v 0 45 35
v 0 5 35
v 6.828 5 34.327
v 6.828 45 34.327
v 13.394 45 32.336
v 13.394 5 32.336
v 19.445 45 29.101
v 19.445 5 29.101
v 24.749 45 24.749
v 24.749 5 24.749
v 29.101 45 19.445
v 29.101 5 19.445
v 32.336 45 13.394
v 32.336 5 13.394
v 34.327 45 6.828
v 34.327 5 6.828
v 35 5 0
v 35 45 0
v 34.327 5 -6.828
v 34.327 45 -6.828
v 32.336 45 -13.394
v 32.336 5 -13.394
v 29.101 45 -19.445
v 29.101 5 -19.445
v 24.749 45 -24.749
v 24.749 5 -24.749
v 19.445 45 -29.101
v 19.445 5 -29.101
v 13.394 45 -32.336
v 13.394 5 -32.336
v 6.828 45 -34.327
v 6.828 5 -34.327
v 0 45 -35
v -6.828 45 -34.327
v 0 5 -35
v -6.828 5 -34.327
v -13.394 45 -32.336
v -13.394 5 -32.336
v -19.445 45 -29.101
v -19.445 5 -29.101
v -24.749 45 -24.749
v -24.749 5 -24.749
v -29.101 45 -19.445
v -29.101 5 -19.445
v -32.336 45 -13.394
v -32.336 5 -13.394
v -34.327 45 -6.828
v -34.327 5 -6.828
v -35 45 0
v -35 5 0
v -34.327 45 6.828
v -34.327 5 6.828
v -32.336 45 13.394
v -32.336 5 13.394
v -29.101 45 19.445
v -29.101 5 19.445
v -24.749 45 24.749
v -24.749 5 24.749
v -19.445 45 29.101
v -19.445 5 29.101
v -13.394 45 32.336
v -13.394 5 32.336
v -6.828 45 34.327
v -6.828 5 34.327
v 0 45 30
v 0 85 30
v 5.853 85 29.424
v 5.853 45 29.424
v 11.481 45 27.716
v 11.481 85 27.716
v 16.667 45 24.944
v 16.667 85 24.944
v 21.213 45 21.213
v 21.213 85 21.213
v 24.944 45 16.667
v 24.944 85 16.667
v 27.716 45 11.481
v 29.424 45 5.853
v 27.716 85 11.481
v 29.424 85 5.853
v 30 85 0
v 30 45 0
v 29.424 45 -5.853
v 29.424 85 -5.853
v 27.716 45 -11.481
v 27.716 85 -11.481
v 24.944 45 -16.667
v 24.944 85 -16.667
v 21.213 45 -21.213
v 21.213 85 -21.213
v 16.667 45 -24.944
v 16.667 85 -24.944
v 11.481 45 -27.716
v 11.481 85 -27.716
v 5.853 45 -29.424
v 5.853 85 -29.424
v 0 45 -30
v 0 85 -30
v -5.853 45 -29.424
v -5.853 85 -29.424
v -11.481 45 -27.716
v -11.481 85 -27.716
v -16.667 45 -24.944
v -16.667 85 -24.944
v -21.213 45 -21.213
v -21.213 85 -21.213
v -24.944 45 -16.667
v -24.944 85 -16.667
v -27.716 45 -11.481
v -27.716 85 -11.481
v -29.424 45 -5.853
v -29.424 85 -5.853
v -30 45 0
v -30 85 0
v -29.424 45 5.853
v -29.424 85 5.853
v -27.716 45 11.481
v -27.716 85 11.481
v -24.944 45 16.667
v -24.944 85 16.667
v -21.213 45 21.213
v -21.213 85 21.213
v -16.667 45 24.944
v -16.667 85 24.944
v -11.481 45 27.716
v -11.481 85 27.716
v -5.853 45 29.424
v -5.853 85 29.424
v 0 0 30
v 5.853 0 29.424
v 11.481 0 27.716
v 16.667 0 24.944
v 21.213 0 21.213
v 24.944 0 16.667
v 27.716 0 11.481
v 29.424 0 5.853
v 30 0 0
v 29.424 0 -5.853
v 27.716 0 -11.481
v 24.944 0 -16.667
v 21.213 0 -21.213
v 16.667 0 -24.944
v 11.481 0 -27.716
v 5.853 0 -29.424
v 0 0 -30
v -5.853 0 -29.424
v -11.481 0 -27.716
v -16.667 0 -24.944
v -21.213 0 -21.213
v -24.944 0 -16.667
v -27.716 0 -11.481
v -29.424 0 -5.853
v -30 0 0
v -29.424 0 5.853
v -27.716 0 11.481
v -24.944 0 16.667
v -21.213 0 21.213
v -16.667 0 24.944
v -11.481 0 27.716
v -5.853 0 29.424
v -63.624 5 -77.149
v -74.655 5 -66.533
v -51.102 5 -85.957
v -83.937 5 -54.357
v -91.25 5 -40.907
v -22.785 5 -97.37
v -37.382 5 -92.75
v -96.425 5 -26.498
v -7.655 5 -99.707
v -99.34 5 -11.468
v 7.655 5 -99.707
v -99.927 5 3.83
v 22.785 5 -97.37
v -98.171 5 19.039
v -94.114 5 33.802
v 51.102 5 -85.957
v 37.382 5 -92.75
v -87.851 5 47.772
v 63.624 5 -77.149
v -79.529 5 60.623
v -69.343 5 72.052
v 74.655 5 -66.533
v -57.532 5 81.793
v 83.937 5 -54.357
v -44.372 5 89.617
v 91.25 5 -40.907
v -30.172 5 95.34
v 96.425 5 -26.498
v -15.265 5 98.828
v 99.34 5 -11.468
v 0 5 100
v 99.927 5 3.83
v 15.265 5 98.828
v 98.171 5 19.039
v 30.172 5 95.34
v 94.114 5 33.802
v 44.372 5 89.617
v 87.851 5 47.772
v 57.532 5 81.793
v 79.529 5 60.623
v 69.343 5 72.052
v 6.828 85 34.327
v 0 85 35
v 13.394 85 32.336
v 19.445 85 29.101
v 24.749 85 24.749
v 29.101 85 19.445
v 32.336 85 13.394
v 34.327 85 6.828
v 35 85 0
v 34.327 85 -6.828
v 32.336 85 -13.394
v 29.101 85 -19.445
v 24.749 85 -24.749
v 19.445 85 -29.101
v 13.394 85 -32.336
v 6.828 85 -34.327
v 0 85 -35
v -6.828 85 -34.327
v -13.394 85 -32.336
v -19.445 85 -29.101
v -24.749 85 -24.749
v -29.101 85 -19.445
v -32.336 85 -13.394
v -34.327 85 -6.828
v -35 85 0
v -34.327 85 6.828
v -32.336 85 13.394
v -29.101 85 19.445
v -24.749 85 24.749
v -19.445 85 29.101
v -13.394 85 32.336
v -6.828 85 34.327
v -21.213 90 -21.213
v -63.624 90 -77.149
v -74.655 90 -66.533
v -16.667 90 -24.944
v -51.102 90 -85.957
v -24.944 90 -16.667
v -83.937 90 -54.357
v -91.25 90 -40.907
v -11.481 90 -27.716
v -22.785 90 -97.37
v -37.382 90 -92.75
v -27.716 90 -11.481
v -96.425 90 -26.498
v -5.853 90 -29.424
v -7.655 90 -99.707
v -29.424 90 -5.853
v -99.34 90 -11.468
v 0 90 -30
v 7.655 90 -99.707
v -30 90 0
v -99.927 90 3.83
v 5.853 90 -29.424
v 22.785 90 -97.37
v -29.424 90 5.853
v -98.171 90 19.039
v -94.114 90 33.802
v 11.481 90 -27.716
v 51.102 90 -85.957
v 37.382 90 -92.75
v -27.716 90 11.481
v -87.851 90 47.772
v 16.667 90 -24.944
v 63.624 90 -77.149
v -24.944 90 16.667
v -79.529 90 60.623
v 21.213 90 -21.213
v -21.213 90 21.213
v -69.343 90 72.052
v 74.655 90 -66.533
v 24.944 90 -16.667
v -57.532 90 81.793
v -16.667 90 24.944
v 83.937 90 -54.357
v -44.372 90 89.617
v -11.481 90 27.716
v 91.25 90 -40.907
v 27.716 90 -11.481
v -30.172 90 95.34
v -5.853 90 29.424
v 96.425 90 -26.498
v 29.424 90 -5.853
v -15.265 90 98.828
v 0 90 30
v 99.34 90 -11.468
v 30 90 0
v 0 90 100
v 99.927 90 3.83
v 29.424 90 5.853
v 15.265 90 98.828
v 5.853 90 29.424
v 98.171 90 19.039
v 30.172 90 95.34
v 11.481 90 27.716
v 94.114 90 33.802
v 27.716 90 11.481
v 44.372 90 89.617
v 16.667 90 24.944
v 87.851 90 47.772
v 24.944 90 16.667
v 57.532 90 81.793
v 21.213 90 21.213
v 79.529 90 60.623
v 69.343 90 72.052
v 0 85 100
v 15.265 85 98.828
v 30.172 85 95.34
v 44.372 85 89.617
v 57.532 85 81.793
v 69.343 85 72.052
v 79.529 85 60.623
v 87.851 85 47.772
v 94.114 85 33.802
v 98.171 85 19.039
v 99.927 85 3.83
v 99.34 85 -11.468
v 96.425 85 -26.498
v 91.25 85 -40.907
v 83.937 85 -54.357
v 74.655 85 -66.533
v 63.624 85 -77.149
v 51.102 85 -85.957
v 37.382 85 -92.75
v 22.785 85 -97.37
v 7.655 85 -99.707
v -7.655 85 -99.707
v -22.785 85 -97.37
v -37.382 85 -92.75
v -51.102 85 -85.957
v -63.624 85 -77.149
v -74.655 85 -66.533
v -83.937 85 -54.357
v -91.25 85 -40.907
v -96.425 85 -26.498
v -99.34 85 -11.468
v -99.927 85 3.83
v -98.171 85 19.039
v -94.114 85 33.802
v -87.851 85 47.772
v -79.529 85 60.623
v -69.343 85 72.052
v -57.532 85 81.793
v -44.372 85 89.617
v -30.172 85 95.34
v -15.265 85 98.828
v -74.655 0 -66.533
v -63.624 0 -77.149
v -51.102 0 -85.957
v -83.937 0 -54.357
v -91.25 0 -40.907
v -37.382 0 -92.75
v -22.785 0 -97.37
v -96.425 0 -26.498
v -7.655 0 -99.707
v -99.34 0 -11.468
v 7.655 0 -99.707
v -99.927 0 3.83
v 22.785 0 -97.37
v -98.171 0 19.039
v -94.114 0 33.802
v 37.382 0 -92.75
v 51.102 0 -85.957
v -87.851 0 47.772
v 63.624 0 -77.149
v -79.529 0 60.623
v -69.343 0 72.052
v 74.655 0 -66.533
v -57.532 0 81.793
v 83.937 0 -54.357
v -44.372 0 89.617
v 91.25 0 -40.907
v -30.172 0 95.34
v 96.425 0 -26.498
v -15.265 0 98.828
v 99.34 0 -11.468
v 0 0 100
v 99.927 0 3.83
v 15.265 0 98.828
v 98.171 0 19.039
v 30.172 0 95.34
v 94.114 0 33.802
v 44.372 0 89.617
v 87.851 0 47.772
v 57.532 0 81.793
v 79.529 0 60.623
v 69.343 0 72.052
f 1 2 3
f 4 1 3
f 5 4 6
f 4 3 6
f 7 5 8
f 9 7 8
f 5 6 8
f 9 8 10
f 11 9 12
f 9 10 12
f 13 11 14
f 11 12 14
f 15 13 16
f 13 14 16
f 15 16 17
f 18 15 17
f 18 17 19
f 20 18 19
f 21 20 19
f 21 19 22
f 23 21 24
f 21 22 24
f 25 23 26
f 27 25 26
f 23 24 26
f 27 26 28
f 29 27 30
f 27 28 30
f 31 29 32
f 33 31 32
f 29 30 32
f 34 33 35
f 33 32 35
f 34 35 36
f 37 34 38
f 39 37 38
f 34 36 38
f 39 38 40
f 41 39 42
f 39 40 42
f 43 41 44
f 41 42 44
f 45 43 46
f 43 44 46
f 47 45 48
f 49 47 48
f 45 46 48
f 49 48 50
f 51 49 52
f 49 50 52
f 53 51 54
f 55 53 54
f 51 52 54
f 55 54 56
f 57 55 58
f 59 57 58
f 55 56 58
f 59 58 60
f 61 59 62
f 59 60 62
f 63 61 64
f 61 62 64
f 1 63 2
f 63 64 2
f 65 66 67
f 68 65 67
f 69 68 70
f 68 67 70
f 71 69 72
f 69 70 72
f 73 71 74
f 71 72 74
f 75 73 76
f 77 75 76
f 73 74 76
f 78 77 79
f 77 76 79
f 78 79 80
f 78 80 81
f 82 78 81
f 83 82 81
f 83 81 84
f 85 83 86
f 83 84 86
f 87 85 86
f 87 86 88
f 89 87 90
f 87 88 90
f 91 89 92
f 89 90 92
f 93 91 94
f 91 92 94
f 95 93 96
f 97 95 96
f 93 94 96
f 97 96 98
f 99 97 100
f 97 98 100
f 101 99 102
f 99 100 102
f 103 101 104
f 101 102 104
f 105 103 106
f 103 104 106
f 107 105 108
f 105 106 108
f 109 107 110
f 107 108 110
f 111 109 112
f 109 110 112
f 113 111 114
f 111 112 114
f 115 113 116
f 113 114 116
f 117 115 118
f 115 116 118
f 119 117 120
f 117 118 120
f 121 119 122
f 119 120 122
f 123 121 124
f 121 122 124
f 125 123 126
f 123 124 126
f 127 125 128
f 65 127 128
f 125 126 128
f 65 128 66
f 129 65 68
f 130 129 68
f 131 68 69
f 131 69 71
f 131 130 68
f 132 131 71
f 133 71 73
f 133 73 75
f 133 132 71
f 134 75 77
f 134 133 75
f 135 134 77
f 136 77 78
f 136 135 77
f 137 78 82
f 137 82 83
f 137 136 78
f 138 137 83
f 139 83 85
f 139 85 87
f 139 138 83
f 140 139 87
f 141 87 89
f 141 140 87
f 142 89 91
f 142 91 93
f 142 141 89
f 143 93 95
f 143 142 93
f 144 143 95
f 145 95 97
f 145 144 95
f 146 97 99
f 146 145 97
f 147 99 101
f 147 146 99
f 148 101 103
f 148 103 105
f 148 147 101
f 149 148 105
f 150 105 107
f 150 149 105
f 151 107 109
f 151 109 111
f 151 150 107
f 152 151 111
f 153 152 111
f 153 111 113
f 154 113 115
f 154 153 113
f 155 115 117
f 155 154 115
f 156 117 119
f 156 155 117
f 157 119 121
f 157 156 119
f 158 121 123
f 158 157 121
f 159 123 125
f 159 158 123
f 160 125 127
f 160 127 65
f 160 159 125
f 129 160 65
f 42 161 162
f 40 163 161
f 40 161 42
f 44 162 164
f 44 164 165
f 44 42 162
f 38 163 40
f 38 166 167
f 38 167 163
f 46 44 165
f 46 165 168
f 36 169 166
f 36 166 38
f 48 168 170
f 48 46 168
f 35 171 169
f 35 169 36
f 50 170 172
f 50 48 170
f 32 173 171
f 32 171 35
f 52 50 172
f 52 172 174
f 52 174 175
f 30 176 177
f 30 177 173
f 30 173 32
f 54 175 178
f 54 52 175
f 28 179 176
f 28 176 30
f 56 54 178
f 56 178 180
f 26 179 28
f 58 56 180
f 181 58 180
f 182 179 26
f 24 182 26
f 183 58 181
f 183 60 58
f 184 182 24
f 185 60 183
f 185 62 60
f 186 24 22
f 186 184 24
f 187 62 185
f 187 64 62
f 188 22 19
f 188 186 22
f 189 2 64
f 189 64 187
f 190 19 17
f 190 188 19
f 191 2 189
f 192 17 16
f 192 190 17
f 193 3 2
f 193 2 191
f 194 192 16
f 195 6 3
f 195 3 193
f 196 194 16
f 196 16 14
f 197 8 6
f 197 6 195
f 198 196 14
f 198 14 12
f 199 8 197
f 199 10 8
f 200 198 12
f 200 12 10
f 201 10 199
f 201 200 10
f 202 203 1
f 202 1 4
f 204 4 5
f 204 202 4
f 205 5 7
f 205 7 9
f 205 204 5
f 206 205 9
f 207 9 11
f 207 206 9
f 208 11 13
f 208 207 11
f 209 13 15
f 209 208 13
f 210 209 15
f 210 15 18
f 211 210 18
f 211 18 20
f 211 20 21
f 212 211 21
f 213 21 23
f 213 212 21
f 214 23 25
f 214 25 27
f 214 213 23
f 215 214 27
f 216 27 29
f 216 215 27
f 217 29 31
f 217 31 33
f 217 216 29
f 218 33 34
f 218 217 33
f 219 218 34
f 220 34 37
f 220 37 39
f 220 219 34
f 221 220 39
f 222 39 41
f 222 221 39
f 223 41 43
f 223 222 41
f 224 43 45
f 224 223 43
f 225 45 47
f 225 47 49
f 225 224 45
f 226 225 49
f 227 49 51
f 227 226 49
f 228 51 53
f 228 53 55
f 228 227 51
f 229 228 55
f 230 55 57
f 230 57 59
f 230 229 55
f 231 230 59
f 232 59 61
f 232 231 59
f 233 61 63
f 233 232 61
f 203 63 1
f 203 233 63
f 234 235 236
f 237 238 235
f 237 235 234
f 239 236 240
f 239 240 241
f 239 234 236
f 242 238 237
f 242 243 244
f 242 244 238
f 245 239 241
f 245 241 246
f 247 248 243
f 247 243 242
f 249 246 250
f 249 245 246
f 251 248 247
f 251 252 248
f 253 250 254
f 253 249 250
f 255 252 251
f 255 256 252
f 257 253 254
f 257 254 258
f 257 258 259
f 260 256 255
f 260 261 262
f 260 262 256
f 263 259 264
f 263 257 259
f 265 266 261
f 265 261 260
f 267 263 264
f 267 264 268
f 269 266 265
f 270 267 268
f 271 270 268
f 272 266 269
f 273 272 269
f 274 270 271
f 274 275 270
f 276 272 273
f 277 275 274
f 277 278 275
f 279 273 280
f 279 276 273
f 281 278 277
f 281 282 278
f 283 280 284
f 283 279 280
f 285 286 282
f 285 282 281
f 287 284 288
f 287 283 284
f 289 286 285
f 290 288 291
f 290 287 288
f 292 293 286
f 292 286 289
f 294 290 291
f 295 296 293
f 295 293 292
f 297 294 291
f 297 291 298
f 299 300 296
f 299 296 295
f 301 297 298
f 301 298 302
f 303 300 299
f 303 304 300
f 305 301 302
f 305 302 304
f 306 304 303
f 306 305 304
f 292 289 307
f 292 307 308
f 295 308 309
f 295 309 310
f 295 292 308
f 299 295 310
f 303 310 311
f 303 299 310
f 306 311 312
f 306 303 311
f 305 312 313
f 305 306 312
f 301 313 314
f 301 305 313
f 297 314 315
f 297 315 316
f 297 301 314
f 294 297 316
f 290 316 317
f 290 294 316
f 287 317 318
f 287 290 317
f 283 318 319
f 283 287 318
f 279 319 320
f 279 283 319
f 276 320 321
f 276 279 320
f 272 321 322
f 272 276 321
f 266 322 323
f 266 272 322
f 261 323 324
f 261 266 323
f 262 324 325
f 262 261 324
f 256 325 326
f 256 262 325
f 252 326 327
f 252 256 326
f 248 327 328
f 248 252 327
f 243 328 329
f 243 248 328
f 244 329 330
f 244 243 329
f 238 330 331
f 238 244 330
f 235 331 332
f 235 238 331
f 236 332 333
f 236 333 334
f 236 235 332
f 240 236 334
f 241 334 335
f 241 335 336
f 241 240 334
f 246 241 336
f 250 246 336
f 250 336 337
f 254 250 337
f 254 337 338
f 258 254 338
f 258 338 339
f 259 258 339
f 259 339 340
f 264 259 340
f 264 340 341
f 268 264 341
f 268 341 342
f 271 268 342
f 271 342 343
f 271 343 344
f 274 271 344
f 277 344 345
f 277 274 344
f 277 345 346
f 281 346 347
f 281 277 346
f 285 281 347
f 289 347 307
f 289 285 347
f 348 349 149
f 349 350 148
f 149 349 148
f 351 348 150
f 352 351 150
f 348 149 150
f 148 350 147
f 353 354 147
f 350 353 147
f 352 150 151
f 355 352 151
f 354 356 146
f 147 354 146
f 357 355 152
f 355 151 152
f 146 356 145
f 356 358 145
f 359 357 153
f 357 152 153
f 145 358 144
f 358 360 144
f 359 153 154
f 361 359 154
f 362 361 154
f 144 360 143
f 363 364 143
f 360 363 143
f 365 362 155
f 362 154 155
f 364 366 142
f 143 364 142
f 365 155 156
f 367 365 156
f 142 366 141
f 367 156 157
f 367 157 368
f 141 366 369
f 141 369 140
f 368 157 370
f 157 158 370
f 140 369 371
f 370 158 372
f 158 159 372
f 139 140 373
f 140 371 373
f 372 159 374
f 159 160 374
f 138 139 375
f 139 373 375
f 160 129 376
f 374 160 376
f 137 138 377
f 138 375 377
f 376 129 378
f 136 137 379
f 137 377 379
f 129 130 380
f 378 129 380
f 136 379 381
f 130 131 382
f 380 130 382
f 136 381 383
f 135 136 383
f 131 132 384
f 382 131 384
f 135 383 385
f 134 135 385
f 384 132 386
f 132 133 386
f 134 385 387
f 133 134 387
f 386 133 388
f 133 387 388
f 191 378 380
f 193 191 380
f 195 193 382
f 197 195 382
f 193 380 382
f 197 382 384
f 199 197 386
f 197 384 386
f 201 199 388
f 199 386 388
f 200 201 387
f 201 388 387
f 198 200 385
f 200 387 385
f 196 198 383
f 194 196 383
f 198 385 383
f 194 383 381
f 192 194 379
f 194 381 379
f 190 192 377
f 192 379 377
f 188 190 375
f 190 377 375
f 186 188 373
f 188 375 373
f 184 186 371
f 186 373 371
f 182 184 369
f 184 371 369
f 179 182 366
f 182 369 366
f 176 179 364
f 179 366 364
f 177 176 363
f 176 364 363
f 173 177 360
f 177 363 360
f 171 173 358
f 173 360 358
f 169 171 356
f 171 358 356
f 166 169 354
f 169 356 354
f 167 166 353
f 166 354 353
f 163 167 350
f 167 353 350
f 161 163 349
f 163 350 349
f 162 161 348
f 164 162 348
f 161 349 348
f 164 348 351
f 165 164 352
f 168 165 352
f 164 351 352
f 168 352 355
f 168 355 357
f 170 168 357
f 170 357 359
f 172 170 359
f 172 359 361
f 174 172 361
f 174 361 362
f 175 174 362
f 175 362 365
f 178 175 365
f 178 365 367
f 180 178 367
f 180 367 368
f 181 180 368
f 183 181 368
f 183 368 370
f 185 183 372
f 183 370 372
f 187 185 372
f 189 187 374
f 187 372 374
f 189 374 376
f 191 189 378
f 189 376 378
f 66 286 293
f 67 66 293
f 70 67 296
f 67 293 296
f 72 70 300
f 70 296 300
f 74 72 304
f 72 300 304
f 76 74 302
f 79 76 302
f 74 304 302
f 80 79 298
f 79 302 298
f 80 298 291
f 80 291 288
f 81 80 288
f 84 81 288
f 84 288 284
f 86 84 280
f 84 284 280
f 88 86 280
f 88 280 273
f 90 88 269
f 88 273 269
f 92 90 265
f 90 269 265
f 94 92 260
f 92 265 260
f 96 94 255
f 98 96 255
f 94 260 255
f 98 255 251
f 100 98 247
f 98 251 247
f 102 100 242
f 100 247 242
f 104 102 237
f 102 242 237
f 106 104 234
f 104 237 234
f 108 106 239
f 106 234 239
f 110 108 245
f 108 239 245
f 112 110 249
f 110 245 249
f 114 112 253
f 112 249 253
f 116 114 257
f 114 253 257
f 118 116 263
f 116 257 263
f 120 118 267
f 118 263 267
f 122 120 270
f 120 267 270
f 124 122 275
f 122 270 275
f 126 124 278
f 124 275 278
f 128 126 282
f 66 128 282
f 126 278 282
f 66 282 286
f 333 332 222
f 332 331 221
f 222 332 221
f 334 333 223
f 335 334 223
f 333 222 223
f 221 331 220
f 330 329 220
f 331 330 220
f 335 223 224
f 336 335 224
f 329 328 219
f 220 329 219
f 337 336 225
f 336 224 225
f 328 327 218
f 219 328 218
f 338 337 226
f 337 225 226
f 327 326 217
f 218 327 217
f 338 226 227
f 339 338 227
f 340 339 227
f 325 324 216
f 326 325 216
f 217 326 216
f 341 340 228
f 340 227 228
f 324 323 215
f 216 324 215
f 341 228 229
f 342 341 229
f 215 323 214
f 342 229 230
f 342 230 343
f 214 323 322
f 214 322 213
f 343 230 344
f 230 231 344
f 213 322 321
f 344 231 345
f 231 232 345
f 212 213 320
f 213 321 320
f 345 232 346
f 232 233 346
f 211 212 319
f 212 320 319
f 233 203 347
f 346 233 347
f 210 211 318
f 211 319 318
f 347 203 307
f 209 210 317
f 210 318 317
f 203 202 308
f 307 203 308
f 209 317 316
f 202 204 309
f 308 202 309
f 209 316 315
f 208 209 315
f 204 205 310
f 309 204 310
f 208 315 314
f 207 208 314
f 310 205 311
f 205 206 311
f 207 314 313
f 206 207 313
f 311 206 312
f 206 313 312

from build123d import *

# Parameters (mm, degrees)
SKETCH1_R           = 100
SKETCH1_R_2         = 30
BOSS_EXTRUDE1_DEPTH = 5
SKETCH2_R           = 35
SKETCH2_R_2         = 30
BOSS_EXTRUDE2_DEPTH = 40


with BuildPart() as part:
    # Sketch1 → Boss-Extrude1 (new body)
    with BuildSketch(Plane(origin=(0, 0, 0), x_dir=(1, 0, 0), z_dir=(0, 1, 0))):
        with Locations(Location((0, 0, 0), (0, 0, 270))):
            Circle(SKETCH1_R)
        with Locations(Location((0, 0, 0), (0, 0, 270))):
            Circle(SKETCH1_R_2, mode=Mode.SUBTRACT)
    boss_extrude1 = extrude(amount=BOSS_EXTRUDE1_DEPTH)

    # Sketch2 → Boss-Extrude2 (add)
    with BuildSketch(Plane(origin=(0, 5, 0), x_dir=(1, 0, 0), z_dir=(0, 1, 0))):
        with Locations(Location((0, 0, 0), (0, 0, 270))):
            Circle(SKETCH2_R)
        with Locations(Location((0, 0, 0), (0, 0, 270))):
            Circle(SKETCH2_R_2, mode=Mode.SUBTRACT)
    boss_extrude2 = extrude(amount=BOSS_EXTRUDE2_DEPTH)

    # Mirror1: Boss-Extrude1, Boss-Extrude2 across plane
    add(boss_extrude1.mirror(Plane.ZX.offset(45)))
    add(boss_extrude2.mirror(Plane.ZX.offset(45)))


solid = part.part
